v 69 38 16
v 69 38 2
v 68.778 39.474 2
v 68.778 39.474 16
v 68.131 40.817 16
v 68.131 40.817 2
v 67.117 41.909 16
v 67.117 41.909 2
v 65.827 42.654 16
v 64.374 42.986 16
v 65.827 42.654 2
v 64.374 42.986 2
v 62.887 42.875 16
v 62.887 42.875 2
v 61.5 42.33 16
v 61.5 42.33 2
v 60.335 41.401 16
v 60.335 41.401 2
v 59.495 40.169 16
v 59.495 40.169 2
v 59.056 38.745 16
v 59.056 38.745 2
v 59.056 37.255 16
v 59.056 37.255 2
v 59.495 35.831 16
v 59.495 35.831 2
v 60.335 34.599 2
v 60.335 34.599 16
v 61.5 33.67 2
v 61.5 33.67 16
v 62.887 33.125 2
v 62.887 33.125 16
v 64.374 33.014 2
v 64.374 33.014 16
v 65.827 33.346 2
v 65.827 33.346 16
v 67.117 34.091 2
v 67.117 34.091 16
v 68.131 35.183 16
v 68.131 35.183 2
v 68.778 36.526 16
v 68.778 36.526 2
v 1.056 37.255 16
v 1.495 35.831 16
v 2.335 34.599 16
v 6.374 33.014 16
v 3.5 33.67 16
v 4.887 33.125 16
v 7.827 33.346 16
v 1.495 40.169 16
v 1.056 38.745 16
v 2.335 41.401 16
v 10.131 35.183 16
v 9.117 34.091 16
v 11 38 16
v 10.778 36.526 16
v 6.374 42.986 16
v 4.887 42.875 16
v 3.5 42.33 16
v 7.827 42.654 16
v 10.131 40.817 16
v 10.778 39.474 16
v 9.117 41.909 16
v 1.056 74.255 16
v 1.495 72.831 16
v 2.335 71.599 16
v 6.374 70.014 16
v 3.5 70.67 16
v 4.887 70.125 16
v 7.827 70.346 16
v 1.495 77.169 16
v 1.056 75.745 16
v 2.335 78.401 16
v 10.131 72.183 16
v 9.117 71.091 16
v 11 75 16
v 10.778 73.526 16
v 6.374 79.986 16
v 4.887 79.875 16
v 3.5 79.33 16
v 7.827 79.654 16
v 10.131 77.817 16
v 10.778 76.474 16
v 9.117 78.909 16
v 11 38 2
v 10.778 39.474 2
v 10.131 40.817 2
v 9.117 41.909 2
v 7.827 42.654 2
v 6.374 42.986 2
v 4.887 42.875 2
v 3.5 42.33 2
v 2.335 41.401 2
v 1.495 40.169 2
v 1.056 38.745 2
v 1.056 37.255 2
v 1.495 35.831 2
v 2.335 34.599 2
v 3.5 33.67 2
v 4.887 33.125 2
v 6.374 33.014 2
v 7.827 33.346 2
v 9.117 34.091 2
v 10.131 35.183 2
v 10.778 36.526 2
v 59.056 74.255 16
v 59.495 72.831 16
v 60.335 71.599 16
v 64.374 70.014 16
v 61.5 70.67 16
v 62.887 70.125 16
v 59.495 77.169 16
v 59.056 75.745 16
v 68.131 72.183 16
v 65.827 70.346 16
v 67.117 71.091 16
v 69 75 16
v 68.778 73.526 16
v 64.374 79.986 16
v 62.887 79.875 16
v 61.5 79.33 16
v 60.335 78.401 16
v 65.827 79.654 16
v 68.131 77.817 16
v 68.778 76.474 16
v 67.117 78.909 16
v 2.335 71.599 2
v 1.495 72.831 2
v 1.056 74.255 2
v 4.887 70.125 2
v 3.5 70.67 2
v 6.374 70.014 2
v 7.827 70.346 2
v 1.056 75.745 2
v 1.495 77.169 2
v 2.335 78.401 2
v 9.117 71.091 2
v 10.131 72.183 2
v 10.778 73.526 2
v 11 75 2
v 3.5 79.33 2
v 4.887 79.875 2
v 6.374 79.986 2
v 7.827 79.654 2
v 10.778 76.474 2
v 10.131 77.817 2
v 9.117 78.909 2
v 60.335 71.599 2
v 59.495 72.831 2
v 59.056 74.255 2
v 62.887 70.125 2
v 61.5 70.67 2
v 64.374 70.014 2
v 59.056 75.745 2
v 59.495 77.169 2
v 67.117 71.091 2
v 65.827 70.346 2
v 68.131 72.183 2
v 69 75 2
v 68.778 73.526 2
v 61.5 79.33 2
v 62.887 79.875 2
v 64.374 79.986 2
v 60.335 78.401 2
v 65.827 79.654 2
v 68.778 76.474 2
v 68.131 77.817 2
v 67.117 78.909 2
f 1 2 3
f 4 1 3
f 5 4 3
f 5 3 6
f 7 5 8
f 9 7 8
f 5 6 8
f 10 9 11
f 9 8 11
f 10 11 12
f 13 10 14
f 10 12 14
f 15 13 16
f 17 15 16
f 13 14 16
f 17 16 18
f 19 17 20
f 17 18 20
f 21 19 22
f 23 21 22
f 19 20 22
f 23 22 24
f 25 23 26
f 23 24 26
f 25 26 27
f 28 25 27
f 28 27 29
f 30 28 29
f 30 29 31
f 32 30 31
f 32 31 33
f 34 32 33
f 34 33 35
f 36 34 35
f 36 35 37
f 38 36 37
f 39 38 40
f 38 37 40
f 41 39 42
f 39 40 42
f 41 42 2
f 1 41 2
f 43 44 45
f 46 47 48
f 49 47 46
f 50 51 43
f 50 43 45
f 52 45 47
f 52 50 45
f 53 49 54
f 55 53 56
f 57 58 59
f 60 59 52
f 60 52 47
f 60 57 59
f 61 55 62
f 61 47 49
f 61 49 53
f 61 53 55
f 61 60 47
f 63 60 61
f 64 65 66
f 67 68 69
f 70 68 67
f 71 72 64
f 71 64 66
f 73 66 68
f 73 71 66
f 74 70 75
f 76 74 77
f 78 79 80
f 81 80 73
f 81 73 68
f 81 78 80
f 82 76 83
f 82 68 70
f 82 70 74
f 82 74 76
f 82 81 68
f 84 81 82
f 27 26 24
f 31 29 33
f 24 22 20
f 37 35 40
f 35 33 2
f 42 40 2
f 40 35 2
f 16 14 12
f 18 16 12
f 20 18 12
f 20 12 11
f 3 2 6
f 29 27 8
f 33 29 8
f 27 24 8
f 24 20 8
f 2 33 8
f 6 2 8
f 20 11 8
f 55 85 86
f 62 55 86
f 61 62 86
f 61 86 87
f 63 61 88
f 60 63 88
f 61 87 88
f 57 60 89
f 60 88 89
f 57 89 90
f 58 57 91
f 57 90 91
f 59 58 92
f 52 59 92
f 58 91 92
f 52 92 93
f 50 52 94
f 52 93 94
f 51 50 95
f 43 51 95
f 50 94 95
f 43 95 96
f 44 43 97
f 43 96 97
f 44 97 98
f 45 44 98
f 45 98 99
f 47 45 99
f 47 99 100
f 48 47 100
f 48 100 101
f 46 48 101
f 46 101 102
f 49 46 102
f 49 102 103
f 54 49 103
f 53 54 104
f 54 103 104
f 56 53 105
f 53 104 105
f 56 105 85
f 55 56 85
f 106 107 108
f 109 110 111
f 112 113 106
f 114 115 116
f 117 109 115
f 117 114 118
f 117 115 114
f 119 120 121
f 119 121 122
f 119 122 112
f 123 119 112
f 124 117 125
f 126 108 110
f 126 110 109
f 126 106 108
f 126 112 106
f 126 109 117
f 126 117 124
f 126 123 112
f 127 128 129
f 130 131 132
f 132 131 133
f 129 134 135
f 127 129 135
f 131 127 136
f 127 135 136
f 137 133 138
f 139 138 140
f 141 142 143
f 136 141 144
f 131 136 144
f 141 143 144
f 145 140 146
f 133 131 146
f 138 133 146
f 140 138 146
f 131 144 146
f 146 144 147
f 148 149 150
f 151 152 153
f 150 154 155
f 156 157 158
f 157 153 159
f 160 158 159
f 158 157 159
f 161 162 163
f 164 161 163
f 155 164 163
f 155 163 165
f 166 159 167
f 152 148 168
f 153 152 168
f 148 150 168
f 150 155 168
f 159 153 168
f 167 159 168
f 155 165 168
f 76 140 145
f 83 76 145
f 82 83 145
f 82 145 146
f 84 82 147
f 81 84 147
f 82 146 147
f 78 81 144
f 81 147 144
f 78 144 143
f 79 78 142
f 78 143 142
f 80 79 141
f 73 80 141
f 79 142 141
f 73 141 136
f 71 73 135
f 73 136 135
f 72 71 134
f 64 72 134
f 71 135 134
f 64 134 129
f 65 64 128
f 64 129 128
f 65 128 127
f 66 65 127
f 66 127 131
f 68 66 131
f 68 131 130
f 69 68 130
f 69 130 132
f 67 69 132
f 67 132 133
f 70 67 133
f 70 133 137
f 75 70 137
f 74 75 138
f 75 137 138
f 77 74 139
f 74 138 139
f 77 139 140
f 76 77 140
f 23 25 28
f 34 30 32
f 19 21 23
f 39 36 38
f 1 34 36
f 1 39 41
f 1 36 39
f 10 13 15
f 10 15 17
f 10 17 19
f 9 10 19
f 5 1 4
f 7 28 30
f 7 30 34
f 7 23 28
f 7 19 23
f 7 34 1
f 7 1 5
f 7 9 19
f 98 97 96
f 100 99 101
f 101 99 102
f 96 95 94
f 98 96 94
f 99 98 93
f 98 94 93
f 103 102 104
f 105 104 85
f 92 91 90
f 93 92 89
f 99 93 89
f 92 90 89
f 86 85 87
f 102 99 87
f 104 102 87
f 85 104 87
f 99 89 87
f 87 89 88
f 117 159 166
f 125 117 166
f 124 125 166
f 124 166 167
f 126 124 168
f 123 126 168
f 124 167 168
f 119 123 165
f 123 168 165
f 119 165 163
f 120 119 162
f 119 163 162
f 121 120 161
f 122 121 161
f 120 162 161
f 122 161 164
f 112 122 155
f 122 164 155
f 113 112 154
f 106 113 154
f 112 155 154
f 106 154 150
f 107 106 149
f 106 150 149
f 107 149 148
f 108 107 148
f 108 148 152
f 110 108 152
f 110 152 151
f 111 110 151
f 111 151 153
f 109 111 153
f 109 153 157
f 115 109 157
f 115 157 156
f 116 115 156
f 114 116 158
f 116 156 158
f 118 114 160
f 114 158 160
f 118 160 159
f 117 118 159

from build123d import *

# Parameters (mm, degrees)
CYLINDER_R        = 5
CYLINDER_DEPTH    = 14
CYLINDER001_R     = 5
CYLINDER001_DEPTH = 14
CYLINDER002_R     = 5
CYLINDER002_DEPTH = 14
CYLINDER003_R     = 5
CYLINDER003_DEPTH = 14


with BuildPart() as cylinder:
    # Cylinder → Cylinder (new body)
    with BuildSketch(Plane(origin=(6, 75, 2), x_dir=(1, 0, 0), z_dir=(0, 0, 1))):
        Circle(CYLINDER_R)
    extrude(amount=CYLINDER_DEPTH)


with BuildPart() as cylinder001:
    # Cylinder001 → Cylinder001 (new body)
    with BuildSketch(Plane(origin=(64, 38, 2), x_dir=(1, 0, 0), z_dir=(0, 0, 1))):
        Circle(CYLINDER001_R)
    extrude(amount=CYLINDER001_DEPTH)


with BuildPart() as cylinder002:
    # Cylinder002 → Cylinder002 (new body)
    with BuildSketch(Plane(origin=(6, 38, 2), x_dir=(1, 0, 0), z_dir=(0, 0, 1))):
        Circle(CYLINDER002_R)
    extrude(amount=CYLINDER002_DEPTH)


with BuildPart() as bases:
    # Cylinder003 → Cylinder003 (new body)
    with BuildSketch(Plane(origin=(64, 75, 2), x_dir=(1, 0, 0), z_dir=(0, 0, 1))):
        Circle(CYLINDER003_R)
    extrude(amount=CYLINDER003_DEPTH)

    # Fusion: union Cylinder, Cylinder001, Cylinder002
    add(cylinder.part)
    add(cylinder001.part)
    add(cylinder002.part)


solid = bases.part
